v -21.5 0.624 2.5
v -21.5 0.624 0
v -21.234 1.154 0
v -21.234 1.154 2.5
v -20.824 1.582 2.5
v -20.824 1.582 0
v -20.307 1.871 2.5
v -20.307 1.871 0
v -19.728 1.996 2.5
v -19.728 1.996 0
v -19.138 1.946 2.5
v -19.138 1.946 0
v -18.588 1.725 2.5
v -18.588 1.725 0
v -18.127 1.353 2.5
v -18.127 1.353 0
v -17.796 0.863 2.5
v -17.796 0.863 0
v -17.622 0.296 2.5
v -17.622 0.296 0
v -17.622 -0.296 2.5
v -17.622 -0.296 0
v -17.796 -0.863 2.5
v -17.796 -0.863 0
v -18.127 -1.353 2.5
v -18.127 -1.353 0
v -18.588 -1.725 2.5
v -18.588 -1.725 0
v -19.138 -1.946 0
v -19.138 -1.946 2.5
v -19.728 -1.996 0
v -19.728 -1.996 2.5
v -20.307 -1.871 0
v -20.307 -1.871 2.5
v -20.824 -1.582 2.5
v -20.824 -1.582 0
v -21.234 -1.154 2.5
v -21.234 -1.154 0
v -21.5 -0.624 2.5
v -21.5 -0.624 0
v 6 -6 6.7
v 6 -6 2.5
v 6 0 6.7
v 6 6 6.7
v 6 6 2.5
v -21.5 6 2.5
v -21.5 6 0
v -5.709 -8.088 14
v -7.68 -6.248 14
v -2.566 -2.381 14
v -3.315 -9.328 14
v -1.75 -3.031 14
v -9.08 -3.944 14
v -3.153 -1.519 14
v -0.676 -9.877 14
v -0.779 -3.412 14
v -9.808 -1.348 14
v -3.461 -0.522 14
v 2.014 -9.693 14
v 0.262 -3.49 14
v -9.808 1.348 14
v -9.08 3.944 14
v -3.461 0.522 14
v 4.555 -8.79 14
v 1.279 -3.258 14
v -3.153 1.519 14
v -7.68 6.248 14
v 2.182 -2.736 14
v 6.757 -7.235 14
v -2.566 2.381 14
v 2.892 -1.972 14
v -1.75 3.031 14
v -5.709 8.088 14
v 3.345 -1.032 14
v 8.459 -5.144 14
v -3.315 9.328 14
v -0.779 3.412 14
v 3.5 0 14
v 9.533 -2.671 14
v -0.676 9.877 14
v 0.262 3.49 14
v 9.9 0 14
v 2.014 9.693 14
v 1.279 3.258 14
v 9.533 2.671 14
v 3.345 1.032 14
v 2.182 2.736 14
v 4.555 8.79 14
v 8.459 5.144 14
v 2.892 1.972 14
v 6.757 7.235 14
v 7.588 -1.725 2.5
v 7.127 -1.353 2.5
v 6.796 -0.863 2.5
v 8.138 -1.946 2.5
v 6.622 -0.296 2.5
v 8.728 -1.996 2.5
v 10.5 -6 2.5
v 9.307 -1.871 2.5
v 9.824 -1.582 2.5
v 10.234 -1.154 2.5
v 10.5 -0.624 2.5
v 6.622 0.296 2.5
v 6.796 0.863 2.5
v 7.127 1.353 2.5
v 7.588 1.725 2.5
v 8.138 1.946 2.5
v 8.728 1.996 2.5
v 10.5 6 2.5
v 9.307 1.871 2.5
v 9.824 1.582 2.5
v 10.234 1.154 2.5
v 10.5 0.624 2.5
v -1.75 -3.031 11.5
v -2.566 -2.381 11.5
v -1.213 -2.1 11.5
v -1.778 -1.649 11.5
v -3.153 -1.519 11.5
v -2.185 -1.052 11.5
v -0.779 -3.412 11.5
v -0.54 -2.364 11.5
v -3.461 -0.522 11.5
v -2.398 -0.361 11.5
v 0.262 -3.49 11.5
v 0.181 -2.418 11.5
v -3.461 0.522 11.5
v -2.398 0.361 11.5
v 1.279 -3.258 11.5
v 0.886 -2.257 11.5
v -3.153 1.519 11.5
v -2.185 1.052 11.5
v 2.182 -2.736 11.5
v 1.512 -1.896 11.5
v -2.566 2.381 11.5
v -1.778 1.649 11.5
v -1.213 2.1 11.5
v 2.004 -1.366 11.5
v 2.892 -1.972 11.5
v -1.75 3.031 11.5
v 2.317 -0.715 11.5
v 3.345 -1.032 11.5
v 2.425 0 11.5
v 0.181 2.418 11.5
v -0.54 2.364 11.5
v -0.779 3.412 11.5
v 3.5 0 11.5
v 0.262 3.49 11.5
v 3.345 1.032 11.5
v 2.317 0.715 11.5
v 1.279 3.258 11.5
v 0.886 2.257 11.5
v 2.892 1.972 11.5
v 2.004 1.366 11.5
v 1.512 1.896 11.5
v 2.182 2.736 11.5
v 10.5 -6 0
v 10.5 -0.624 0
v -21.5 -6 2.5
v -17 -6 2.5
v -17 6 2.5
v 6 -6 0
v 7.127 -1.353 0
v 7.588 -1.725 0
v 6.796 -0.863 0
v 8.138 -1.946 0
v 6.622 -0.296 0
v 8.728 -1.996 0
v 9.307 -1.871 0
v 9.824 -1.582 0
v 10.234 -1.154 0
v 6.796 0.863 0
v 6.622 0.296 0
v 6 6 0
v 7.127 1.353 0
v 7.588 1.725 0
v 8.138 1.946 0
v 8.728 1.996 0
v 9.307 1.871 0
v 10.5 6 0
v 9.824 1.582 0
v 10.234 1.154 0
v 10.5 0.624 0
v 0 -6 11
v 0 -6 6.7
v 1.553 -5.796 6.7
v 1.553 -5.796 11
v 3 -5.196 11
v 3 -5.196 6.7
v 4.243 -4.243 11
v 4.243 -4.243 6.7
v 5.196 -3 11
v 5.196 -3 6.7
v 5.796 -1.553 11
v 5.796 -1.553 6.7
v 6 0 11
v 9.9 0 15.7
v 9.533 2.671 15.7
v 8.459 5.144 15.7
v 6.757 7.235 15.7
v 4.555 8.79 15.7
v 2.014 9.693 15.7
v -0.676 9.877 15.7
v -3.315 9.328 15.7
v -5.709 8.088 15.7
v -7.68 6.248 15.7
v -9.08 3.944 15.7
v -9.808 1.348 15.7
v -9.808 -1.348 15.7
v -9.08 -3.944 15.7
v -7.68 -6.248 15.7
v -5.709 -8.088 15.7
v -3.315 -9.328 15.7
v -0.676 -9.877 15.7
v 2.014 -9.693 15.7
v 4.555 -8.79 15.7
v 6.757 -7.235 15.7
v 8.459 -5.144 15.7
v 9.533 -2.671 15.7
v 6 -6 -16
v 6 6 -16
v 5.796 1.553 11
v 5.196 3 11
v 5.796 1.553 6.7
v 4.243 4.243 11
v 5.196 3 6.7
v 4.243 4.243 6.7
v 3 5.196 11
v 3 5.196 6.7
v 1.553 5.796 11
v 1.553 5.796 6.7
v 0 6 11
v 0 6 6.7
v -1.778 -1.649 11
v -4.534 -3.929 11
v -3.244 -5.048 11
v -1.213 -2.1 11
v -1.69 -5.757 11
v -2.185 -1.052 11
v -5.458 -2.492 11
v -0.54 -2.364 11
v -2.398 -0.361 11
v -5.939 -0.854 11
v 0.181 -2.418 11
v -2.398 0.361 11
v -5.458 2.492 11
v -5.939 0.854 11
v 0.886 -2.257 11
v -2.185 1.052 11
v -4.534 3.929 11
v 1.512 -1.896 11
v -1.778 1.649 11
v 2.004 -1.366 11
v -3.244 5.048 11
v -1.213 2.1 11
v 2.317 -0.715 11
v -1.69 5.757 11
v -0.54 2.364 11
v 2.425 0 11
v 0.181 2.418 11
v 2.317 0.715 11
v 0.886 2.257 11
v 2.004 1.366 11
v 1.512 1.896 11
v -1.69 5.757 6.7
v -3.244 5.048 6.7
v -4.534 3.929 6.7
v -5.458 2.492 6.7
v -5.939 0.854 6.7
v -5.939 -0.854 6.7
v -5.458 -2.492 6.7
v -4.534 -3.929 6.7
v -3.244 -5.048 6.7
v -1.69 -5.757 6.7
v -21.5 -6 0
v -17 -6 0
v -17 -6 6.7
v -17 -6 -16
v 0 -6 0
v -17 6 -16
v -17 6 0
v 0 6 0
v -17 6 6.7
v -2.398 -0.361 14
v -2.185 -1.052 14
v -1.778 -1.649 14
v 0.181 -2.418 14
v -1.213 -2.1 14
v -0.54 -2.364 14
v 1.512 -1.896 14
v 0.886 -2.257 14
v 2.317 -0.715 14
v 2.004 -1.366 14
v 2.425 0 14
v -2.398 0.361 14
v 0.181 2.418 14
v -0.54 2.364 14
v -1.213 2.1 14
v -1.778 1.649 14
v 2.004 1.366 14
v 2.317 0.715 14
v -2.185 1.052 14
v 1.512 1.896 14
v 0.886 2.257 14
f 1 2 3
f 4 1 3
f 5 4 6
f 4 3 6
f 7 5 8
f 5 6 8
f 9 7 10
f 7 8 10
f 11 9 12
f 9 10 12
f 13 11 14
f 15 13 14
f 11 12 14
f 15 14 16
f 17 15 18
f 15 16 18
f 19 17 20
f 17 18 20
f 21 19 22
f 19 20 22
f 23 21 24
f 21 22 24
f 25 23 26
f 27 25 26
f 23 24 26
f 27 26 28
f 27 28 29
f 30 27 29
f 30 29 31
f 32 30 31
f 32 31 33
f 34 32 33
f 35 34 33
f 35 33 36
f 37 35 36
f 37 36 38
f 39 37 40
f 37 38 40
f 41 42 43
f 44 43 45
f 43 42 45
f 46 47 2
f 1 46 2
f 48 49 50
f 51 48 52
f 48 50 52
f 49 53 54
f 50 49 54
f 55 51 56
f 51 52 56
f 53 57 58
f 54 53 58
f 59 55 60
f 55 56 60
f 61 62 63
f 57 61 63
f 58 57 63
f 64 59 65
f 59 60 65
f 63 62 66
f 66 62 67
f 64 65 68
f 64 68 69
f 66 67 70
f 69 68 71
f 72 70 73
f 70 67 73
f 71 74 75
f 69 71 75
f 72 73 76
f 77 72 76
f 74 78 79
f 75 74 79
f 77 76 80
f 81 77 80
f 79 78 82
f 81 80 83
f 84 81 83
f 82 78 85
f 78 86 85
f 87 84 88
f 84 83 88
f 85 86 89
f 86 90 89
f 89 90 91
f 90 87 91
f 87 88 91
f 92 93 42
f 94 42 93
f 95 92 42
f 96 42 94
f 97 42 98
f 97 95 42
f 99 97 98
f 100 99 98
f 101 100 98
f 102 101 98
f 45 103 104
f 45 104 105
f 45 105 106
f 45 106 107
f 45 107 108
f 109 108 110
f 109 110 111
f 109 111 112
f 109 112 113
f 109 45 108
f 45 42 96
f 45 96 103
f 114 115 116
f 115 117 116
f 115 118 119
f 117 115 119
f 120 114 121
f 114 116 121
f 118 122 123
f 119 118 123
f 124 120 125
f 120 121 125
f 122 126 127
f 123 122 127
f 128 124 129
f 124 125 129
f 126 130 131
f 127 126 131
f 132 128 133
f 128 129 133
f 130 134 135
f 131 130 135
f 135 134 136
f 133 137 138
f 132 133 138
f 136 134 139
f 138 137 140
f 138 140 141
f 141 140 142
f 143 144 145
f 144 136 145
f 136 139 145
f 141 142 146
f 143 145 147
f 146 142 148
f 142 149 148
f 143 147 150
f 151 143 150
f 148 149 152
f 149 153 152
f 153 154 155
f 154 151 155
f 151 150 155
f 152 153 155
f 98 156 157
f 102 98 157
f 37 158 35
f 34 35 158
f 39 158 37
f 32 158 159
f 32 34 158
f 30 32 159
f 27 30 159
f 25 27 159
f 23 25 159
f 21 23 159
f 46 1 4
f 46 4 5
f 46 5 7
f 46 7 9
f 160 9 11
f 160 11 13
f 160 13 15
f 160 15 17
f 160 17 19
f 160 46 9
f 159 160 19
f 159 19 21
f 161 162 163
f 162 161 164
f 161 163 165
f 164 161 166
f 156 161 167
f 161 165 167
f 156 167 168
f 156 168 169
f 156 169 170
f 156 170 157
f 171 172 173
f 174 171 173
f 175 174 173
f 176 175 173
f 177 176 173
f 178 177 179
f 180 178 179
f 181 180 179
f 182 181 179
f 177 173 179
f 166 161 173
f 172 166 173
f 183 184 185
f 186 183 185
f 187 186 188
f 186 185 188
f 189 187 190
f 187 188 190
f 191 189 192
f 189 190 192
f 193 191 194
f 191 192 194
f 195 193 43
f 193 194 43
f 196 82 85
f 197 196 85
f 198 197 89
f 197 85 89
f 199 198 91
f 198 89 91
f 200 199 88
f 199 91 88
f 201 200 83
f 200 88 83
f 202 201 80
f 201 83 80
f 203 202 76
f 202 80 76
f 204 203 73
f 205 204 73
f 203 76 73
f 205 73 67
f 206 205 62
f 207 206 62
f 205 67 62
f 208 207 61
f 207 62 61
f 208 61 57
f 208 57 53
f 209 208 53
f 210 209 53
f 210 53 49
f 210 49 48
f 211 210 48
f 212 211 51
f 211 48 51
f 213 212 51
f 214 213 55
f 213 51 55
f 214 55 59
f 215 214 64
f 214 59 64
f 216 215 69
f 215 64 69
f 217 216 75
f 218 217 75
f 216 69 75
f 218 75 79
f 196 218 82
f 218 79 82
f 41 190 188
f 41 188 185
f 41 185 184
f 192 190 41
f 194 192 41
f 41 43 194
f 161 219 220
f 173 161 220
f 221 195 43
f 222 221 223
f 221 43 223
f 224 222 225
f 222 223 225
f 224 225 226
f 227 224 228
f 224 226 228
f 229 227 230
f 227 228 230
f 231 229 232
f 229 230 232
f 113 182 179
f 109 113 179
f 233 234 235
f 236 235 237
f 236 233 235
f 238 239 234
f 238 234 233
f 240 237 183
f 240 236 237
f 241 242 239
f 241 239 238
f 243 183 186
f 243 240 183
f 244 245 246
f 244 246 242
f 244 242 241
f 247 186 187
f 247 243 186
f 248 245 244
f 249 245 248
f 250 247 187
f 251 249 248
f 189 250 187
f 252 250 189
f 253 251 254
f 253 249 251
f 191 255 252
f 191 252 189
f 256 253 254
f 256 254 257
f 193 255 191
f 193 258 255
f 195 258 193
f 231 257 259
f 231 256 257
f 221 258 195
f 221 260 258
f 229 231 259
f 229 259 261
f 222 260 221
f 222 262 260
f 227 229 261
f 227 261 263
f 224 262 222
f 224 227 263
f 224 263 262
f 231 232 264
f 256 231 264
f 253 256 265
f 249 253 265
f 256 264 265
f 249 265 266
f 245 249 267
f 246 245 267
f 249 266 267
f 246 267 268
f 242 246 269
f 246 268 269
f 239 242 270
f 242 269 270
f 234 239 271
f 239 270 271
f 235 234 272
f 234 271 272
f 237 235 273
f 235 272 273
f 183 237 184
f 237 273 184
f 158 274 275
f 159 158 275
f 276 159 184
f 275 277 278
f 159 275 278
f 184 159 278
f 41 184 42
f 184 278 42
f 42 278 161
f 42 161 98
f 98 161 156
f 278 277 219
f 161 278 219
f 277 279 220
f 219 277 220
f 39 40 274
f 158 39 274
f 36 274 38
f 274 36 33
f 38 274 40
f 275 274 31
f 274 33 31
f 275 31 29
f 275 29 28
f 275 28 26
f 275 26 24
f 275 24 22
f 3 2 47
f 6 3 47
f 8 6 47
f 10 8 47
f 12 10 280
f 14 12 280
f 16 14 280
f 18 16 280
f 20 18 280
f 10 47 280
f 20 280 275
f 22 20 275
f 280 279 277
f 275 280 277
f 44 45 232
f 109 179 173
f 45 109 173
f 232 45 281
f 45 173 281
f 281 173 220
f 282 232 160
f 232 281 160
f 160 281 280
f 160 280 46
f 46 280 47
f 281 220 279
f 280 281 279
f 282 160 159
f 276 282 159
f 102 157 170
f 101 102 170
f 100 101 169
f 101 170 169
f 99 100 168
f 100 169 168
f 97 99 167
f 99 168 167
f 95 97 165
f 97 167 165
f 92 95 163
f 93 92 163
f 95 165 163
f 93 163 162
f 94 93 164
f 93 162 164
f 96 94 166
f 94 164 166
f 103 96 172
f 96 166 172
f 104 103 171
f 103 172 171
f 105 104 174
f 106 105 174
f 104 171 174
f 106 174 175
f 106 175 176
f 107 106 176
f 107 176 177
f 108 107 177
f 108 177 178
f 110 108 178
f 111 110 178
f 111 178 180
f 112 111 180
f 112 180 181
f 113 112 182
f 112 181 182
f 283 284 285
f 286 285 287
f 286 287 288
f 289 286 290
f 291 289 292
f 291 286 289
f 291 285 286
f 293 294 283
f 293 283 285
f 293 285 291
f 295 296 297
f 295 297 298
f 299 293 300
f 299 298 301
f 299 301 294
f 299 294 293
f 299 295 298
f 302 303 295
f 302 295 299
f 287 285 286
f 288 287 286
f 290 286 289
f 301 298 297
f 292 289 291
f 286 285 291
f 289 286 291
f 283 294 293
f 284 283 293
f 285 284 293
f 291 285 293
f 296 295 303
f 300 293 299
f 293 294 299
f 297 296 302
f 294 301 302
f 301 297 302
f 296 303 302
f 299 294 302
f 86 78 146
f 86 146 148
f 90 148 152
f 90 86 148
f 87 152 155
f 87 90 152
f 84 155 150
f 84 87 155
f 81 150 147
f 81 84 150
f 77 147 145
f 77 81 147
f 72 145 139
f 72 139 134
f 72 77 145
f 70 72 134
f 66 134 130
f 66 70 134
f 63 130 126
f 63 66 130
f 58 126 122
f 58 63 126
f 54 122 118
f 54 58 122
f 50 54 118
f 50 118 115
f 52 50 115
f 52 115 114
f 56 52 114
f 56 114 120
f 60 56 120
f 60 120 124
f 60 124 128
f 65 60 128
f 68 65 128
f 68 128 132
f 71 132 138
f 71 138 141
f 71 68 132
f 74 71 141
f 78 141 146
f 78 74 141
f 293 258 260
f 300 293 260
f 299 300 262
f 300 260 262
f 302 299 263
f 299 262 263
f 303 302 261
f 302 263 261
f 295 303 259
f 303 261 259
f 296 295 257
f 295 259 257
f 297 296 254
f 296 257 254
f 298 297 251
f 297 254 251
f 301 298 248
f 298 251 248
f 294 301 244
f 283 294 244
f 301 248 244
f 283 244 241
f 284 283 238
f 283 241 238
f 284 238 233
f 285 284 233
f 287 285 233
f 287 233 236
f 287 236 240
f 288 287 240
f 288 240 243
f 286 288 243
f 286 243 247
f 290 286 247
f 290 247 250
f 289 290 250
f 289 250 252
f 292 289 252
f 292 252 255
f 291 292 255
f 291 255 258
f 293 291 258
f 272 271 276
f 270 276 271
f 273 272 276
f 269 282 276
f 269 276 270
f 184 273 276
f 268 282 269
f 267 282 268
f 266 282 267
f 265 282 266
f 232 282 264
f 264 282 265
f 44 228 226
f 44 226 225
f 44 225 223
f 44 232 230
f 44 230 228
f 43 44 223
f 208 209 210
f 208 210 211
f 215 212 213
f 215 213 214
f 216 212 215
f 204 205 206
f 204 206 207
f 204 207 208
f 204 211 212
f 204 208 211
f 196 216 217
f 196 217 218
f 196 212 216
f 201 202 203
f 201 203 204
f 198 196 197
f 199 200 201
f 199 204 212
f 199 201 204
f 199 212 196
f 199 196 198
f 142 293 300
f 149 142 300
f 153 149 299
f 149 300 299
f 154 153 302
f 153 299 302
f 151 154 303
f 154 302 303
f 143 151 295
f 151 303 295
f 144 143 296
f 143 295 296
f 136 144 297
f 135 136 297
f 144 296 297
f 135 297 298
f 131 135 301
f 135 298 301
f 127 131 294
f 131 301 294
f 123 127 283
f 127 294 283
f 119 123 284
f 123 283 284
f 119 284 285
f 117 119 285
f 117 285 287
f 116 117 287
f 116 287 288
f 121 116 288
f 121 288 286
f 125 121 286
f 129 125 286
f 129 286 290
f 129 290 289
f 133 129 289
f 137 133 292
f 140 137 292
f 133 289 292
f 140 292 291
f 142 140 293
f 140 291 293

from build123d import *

# Parameters (mm, degrees)
F0_R          = 2.425
F1_DEPTH      = 16
F1_DEPTH_BACK = 6.7
F2_DEPTH      = 2.5
F3_DEPTH      = 11
F4_DEPTH      = 14
F5_R          = 3.5
F5_R_2        = 2.425
F6_DEPTH      = 2.5
F5_R_3        = 9.9
F7_DEPTH      = 1.7


with BuildPart() as f1:
    # F0 (on Top) → F1 (new body, two sides)
    with BuildSketch(Plane.XY) as f1_sk:
        with BuildLine():
            Line((1.67e-08, 6), (-17, 6))
            Line((-17, 6), (-17, -6))
            Line((-17, -6), (0, -6))
            ThreePointArc((0, -6), (-6, 8.4e-09), (1.67e-08, 6))
        make_face()
        with BuildLine():
            ThreePointArc((6, 0), (4.242640693, 4.2426406812), (1.67e-08, 6))
            ThreePointArc((1.67e-08, 6), (-6, 8.4e-09), (0, -6))
            ThreePointArc((0, -6), (4.2426406871, -4.2426406871), (6, 0))
        make_face()
        Circle(F0_R, mode=Mode.SUBTRACT)
        Circle(F0_R)
        with BuildLine():
            Line((6, 6), (1.67e-08, 6))
            ThreePointArc((1.67e-08, 6), (4.242640693, 4.2426406812), (6, 0))
            Line((6, 0), (6, 6))
        make_face()
        with BuildLine():
            Line((6, -6), (6, 0))
            ThreePointArc((6, 0), (4.2426406871, -4.2426406871), (0, -6))
            Line((0, -6), (6, -6))
        make_face()
    extrude(amount=-F1_DEPTH)
    extrude(f1_sk.sketch, amount=F1_DEPTH_BACK)

    # F0 (on Top) → F2 (join)
    with BuildSketch(Plane.XY):
        with BuildLine():
            Line((-17, -6), (-17, 6))
            Line((-17, 6), (-21.5, 6))
            Line((-21.5, 6), (-21.5, 0.6244997998))
            ThreePointArc((-21.5, 0.6244997998), (-17.6, 0), (-21.5, -0.6244997998))
            Line((-21.5, -0.6244997998), (-21.5, -6))
            Line((-21.5, -6), (-17, -6))
        make_face()
        with BuildLine():
            Line((10.5, 6), (6, 6))
            Line((6, 6), (6, 0))
            Line((6, 0), (6, -6))
            Line((6, -6), (10.5, -6))
            Line((10.5, -6), (10.5, -0.6244997998))
            ThreePointArc((10.5, -0.6244997998), (6.6, 0), (10.5, 0.6244997998))
            Line((10.5, 0.6244997998), (10.5, 6))
        make_face()
    extrude(amount=F2_DEPTH)

    # F0 (on Top) → F3 (join)
    with BuildSketch(Plane.XY):
        with BuildLine():
            ThreePointArc((6, 0), (4.242640693, 4.2426406812), (1.67e-08, 6))
            ThreePointArc((1.67e-08, 6), (-6, 8.4e-09), (0, -6))
            ThreePointArc((0, -6), (4.2426406871, -4.2426406871), (6, 0))
        make_face()
        Circle(F0_R, mode=Mode.SUBTRACT)
        Circle(F0_R)
    extrude(amount=F3_DEPTH)

    # F0 (on Top) → F4 (join)
    with BuildSketch(Plane.XY):
        Circle(F0_R)
    extrude(amount=F4_DEPTH)


with BuildPart() as f6:
    # F5 (on face) → F6 (new body)
    with BuildSketch(Plane.XY.offset(14)):
        Circle(F5_R)
        Circle(F5_R_2, mode=Mode.SUBTRACT)
    extrude(amount=-F6_DEPTH)

    # F5 (on face) → F7 (join)
    with BuildSketch(Plane.XY.offset(14)):
        Circle(F5_R_3)
        Circle(F5_R, mode=Mode.SUBTRACT)
        Circle(F5_R)
        Circle(F5_R_2, mode=Mode.SUBTRACT)
        Circle(F5_R_2)
    extrude(amount=F7_DEPTH)


solid = Compound([f1.part, f6.part])
